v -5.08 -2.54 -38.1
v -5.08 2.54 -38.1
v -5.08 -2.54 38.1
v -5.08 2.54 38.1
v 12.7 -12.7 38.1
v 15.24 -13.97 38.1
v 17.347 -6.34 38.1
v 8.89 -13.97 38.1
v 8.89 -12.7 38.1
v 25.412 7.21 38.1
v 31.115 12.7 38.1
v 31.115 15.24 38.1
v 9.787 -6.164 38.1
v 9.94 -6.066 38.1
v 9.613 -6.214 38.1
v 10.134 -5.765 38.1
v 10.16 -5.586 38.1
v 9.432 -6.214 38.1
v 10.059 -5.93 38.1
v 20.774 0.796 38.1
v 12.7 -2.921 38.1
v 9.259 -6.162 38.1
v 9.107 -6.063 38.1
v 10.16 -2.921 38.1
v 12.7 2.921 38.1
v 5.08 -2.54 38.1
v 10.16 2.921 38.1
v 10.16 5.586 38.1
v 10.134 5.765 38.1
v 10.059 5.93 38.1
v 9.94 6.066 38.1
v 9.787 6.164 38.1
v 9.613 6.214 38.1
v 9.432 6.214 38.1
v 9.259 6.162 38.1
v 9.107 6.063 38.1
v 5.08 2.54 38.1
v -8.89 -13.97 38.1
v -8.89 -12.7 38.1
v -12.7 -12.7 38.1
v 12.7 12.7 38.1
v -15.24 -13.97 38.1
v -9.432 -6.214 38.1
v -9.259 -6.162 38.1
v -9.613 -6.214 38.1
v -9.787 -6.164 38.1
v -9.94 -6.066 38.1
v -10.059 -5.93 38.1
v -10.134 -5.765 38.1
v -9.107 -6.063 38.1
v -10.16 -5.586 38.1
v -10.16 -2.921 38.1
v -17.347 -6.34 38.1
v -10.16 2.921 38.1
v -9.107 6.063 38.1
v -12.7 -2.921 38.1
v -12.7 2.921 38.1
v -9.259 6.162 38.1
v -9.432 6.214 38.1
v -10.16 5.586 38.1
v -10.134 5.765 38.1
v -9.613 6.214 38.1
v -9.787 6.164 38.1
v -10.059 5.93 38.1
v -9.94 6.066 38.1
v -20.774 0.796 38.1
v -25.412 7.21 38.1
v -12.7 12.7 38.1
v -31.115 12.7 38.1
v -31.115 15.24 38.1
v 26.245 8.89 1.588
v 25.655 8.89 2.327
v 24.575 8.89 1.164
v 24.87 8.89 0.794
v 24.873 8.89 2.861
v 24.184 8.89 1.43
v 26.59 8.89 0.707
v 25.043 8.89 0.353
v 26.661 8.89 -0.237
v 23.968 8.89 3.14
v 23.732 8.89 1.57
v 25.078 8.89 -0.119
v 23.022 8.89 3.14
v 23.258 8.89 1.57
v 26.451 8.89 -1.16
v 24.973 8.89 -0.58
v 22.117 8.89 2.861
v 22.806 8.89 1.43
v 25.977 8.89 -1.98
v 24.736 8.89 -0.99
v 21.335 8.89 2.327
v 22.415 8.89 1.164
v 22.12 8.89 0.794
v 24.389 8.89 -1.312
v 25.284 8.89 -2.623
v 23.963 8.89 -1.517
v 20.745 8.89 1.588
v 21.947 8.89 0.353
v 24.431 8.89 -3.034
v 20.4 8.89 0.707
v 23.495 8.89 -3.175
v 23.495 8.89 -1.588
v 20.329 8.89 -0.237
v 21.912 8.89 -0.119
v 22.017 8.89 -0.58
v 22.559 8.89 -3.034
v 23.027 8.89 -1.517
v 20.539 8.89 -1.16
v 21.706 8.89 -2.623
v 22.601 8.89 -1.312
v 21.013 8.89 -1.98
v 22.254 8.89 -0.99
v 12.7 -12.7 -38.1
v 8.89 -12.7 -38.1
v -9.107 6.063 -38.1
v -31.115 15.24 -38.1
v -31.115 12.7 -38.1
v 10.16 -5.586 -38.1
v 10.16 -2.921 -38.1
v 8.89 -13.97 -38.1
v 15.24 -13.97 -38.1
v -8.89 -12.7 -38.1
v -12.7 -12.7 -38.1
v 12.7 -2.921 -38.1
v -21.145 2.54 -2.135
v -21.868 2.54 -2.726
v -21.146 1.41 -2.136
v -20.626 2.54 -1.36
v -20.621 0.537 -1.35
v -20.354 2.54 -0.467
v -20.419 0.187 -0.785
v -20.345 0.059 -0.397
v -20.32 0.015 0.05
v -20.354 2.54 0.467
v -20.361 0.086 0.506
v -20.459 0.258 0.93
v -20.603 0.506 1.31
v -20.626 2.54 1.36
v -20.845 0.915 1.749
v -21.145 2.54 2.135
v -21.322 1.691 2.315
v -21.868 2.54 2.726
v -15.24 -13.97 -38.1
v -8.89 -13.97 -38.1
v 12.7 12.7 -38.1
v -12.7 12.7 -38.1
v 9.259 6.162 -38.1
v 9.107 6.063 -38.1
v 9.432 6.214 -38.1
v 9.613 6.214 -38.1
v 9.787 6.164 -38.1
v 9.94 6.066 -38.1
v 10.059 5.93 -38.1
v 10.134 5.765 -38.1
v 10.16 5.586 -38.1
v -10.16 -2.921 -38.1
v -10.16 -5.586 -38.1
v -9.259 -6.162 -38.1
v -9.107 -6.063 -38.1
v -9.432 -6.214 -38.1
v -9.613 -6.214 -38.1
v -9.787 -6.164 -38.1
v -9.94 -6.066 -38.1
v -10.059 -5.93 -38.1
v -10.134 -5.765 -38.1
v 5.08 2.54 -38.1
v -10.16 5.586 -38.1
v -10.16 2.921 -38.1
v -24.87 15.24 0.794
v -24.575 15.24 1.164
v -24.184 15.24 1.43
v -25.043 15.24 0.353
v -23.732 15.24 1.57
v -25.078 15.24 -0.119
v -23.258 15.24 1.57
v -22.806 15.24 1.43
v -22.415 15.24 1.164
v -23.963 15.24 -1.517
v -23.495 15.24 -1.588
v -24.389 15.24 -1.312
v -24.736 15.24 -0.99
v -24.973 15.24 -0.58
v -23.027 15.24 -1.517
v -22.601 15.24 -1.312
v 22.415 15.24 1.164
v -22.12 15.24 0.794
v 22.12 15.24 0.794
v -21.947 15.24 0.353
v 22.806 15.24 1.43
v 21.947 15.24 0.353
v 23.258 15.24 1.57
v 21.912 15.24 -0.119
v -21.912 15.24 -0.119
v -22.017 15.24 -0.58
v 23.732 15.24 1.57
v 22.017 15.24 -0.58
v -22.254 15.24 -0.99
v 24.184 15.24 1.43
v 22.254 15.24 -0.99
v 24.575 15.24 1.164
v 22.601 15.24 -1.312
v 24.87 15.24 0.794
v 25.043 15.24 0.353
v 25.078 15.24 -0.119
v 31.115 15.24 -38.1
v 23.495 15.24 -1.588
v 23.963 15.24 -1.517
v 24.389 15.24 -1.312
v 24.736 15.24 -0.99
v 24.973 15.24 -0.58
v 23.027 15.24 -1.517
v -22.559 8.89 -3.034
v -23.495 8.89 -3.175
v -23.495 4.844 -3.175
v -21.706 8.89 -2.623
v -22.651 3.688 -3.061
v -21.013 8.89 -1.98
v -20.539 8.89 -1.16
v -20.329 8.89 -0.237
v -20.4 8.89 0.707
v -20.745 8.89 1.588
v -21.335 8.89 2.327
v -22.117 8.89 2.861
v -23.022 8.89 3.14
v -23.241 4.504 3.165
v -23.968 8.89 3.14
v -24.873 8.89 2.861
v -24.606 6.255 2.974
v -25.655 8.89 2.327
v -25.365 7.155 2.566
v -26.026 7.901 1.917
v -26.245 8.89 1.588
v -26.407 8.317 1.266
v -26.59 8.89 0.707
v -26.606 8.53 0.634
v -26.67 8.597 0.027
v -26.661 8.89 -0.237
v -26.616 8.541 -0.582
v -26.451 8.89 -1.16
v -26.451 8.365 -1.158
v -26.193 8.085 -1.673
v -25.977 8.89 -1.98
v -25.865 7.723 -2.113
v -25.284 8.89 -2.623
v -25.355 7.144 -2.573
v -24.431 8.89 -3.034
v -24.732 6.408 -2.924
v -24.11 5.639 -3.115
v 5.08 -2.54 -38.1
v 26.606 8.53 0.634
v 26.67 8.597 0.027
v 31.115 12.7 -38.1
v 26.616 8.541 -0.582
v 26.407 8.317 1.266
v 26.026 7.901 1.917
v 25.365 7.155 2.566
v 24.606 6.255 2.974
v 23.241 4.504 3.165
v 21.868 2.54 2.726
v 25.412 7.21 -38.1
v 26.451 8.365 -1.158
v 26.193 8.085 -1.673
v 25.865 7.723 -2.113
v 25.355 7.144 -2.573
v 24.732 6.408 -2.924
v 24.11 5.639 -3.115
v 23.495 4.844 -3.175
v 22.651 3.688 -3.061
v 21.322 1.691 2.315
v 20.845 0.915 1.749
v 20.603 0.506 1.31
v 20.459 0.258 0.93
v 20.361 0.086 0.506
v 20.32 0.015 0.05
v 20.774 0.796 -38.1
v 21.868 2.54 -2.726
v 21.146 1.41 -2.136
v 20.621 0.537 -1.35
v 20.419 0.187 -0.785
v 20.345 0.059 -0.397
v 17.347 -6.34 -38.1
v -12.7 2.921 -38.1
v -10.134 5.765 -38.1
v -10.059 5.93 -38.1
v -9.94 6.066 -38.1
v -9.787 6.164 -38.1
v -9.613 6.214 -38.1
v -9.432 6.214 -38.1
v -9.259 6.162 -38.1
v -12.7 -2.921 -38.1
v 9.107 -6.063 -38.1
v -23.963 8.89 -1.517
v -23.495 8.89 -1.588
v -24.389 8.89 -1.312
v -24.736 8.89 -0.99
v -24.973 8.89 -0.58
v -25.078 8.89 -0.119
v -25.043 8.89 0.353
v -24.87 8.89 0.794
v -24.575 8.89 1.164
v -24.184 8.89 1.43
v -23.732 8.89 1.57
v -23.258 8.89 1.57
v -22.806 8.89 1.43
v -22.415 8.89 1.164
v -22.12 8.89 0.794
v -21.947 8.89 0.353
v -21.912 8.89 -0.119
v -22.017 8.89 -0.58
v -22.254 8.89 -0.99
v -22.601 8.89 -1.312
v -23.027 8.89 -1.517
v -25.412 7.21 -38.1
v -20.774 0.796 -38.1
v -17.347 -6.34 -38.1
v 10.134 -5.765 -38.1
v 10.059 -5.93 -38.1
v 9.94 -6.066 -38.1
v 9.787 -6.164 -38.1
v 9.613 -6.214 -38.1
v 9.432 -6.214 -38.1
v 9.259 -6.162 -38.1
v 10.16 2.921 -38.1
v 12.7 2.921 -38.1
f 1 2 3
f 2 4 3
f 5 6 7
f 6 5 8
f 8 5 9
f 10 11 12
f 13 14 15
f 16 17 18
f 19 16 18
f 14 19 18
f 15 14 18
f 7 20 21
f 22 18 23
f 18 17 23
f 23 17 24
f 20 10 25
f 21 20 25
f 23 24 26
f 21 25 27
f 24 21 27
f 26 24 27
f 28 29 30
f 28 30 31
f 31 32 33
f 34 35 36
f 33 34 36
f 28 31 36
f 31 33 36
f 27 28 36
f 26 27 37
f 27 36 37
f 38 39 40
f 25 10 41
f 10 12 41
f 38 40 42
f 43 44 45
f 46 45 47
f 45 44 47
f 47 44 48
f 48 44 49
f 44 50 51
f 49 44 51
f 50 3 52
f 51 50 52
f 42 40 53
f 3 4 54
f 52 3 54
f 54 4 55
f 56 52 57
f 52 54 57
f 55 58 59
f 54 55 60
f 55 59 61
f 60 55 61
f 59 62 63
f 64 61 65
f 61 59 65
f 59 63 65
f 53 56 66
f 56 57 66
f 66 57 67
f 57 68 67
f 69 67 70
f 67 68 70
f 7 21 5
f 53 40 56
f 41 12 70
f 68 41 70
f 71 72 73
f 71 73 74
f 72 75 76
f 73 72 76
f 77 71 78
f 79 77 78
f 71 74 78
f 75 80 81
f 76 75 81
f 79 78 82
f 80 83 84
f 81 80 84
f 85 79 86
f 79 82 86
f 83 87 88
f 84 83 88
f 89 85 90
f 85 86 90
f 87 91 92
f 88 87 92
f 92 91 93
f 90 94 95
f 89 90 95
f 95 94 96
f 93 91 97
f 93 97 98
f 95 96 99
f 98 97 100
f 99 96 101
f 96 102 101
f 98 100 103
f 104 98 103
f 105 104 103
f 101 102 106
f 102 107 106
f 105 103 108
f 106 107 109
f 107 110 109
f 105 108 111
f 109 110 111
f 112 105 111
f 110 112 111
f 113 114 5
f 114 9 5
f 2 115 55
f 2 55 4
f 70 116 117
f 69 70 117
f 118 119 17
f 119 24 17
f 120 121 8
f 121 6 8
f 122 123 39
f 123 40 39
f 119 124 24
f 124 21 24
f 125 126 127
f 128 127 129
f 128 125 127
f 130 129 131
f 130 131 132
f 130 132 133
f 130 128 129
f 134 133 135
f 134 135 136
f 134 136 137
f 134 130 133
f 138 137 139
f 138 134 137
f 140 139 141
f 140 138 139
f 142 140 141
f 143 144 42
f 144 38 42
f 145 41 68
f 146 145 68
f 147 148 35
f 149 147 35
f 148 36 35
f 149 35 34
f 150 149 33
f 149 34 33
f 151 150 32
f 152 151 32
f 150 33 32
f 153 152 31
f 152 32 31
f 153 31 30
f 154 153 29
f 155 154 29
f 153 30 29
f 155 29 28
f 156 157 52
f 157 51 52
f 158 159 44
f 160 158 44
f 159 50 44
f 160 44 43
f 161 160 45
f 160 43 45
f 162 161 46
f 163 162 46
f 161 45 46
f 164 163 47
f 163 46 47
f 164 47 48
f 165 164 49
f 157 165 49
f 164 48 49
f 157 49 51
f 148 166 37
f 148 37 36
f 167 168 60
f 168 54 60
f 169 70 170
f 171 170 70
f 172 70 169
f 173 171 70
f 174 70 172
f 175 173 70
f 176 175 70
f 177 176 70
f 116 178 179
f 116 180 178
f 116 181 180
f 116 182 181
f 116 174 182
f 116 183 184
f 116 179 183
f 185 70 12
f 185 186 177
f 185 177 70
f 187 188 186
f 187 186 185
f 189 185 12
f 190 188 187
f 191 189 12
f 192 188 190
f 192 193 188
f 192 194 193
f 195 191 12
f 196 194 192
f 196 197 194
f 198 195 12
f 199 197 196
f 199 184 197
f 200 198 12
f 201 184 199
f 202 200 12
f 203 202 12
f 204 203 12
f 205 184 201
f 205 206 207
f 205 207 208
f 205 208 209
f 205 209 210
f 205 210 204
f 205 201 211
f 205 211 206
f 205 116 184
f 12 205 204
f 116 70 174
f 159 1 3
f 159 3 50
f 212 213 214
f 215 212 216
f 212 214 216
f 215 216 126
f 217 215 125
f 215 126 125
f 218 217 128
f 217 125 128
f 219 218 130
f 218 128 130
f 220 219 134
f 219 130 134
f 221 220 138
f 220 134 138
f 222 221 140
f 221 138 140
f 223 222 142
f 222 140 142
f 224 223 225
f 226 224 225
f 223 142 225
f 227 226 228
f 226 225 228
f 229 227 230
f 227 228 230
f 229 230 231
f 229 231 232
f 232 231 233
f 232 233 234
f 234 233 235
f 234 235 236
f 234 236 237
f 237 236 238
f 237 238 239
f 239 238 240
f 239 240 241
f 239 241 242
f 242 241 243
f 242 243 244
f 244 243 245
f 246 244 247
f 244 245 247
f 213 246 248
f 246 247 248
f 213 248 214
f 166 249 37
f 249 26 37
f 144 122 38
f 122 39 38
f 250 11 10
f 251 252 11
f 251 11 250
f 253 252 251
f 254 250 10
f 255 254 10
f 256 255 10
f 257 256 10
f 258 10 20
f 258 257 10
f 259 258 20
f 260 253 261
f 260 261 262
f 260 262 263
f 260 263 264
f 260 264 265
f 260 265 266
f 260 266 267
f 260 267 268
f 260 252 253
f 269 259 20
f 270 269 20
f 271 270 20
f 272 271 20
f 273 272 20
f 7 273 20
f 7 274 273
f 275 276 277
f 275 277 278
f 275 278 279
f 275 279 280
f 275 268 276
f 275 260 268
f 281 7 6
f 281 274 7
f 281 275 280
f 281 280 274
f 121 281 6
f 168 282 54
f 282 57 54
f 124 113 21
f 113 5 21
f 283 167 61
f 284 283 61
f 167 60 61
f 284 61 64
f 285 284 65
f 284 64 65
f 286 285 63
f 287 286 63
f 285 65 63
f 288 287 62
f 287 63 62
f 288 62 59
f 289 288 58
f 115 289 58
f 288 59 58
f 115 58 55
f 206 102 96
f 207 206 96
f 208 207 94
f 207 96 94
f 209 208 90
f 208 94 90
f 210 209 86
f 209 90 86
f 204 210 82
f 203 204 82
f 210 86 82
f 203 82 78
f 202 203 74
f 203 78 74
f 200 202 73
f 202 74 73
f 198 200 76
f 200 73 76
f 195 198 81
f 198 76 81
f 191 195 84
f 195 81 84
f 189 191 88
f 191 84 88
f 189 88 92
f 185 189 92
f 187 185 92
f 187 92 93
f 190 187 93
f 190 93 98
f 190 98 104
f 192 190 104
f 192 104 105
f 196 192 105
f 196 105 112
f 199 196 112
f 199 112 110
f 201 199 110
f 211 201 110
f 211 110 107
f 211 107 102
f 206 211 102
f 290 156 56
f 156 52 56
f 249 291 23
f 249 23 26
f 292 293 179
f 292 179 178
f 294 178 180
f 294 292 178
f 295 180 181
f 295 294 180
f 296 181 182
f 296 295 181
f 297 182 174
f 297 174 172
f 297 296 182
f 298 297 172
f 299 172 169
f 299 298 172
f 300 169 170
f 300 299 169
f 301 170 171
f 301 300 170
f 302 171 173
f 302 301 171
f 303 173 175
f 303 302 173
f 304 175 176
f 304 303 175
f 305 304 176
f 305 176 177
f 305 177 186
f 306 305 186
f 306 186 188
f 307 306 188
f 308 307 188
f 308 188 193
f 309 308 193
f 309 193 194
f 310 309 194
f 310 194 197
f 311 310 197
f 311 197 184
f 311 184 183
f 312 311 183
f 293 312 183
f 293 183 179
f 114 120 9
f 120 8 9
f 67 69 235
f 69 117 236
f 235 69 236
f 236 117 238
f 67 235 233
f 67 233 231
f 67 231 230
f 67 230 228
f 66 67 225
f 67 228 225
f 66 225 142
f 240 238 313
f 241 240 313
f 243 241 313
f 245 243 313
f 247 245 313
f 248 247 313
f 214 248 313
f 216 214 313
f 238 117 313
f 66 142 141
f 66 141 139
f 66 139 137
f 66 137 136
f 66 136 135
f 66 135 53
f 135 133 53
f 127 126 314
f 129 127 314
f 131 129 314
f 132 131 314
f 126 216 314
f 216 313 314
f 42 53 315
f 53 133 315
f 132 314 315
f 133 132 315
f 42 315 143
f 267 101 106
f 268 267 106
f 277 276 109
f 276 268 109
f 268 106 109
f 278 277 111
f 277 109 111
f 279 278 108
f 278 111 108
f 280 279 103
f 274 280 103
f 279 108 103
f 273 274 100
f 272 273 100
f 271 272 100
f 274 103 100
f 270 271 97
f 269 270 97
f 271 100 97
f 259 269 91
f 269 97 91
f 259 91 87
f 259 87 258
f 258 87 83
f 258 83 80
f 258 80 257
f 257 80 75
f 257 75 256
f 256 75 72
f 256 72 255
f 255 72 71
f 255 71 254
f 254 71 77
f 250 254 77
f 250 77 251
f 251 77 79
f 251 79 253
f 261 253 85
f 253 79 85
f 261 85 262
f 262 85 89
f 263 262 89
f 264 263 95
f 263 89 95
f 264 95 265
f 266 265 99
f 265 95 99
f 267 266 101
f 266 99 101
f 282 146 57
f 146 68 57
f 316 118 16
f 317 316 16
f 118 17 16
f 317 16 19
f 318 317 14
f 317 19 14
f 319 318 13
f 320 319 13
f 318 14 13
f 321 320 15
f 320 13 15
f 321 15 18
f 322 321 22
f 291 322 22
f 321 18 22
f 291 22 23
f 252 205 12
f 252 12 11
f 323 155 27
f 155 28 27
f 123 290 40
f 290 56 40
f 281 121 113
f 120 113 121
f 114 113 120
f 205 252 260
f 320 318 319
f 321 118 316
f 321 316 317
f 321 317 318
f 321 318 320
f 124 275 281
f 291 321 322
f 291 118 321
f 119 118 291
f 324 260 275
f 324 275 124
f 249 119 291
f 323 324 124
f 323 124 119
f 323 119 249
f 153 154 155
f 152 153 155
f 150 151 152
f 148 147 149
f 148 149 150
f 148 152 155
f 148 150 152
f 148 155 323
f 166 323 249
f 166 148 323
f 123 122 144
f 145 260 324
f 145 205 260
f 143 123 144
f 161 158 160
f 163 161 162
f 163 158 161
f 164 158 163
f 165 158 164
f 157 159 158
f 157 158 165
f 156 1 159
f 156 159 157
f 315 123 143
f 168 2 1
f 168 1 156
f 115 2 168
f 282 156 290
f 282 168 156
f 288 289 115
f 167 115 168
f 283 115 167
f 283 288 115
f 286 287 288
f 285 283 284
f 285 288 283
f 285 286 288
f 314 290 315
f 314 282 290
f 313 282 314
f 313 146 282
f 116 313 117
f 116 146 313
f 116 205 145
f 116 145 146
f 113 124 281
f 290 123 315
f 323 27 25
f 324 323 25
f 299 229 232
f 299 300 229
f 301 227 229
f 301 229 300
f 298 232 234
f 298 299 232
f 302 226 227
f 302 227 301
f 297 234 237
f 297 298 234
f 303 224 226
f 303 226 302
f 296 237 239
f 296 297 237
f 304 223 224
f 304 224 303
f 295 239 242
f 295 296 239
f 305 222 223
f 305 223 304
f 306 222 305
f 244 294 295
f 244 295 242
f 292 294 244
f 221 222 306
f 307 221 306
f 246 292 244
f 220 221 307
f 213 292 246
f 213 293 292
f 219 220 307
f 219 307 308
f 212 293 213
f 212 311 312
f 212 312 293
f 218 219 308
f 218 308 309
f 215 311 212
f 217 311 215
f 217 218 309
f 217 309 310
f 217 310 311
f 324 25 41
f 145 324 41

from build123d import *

# Parameters (mm, degrees)
BOSS_EXTRUDE1_DEPTH            = 38.1
BOSS_EXTRUDE3_DEPTH            = 76.2
CUT_EXTRUDE1_REACH             = 53.888
SKETCH4_R                      = 3.175
CUT_EXTRUDE1_DIRECTION_2_DEPTH = 6.35
CUT_EXTRUDE2_REACH             = 56.243
SKETCH5_R                      = 1.5875


with BuildPart() as part:
    # Sketch1 → Boss-Extrude1 (new, symmetric)
    with BuildSketch(Plane.XY):
        with BuildLine():
            Line((12.7, 12.7), (-12.7, 12.7))
            Line((-12.7, 12.7), (-12.7, 2.921))
            Line((-12.7, 2.921), (-10.16, 2.921))
            Line((-10.16, 2.921), (-10.16, 5.585607176))
            ThreePointArc((-10.16, 5.585607176), (-9.787392339, 6.163859076), (-9.106849574, 6.063493377))
            Line((-9.106849574, 6.063493377), (-5.08, 2.54))
            Line((-5.08, 2.54), (-5.08, -2.54))
            Line((-5.08, -2.54), (-9.106849574, -6.063493377))
            ThreePointArc((-9.106849574, -6.063493377), (-9.787392339, -6.163859076), (-10.16, -5.585607176))
            Line((-10.16, -5.585607176), (-10.16, -2.921))
            Line((-10.16, -2.921), (-12.7, -2.921))
            Line((-12.7, -2.921), (-12.7, -12.7))
            Line((-12.7, -12.7), (-8.89, -12.7))
            Line((-8.89, -12.7), (-8.89, -13.97))
            Line((-8.89, -13.97), (-15.24, -13.97))
            Line((-15.24, -13.97), (-15.24, 15.24))
            Line((-15.24, 15.24), (15.24, 15.24))
            Line((15.24, 15.24), (15.24, -13.97))
            Line((15.24, -13.97), (8.89, -13.97))
            Line((8.89, -13.97), (8.89, -12.7))
            Line((8.89, -12.7), (12.7, -12.7))
            Line((12.7, -12.7), (12.7, -2.921))
            Line((12.7, -2.921), (10.16, -2.921))
            Line((10.16, -2.921), (10.16, -5.585607176))
            ThreePointArc((10.16, -5.585607176), (9.787392339, -6.163859076), (9.106849574, -6.063493377))
            Line((9.106849574, -6.063493377), (5.08, -2.54))
            Line((5.08, -2.54), (5.08, 2.54))
            Line((5.08, 2.54), (9.106849574, 6.063493377))
            ThreePointArc((9.106849574, 6.063493377), (9.787392339, 6.163859076), (10.16, 5.585607176))
            Line((10.16, 5.585607176), (10.16, 2.921))
            Line((10.16, 2.921), (12.7, 2.921))
            Line((12.7, 2.921), (12.7, 12.7))
        make_face()
    extrude(amount=BOSS_EXTRUDE1_DEPTH, both=True)

    # Sketch6 → Boss-Extrude3 (add)
    with BuildSketch(Plane(origin=(0, 0, -38.1), x_dir=(-1, 0, 0), z_dir=(0, 0, -1))):
        with BuildLine():
            Line((-15.24, 15.24), (-31.115, 15.24))
            Line((-31.115, 15.24), (-31.115, 12.7))
            ThreePointArc((-31.115, 12.7), (-20.774098647, 0.795596044), (-15.24, -13.97))
            Line((-15.24, -13.97), (-15.24, 15.24))
        make_face()
        with BuildLine():
            Line((15.24, 15.24), (31.115, 15.24))
            Line((31.115, 15.24), (31.115, 12.7))
            ThreePointArc((31.115, 12.7), (20.774098647, 0.795596044), (15.24, -13.97))
            Line((15.24, -13.97), (15.24, 15.24))
        make_face()
    extrude(amount=-BOSS_EXTRUDE3_DEPTH)

    # Sketch4 → Cut-Extrude1 (cut, up to next)
    with BuildSketch(Plane(origin=(0, 2.54, 0), x_dir=(1, 0, 0), z_dir=(0, 1, 0)), mode=Mode.PRIVATE) as cut_extrude1_sk1:
        with Locations(Location((23.495, 0, 0), (0, 0, 90))):
            Circle(SKETCH4_R)
    cut_extrude1_tool1 = extrude(cut_extrude1_sk1.sketch, amount=-CUT_EXTRUDE1_REACH, mode=Mode.PRIVATE) & part.part
    cut_extrude1 = cut_extrude1_tool1.solids().sort_by_distance((23.495, 2.54, 0))[0]
    add(cut_extrude1, mode=Mode.SUBTRACT)

    # Sketch4 → Cut-Extrude1 direction 2 (cut)
    with BuildSketch(Plane(origin=(0, 2.54, 0), x_dir=(1, 0, 0), z_dir=(0, 1, 0))):
        with Locations(Location((23.495, 0, 0), (0, 0, 90))):
            Circle(SKETCH4_R)
    cut_extrude1_direction_2 = extrude(amount=CUT_EXTRUDE1_DIRECTION_2_DEPTH, mode=Mode.SUBTRACT)

    # Sketch5 → Cut-Extrude2 (cut, up to next)
    with BuildSketch(Plane.XZ.offset(-8.89), mode=Mode.PRIVATE) as cut_extrude2_sk1:
        with Locations(Location((23.495, 0, 0), (0, 0, 270))):
            Circle(SKETCH5_R)
    cut_extrude2_tool1 = extrude(cut_extrude2_sk1.sketch, amount=-CUT_EXTRUDE2_REACH, mode=Mode.PRIVATE) & part.part
    cut_extrude2 = cut_extrude2_tool1.solids().sort_by_distance((23.495, 8.89, 0))[0]
    add(cut_extrude2, mode=Mode.SUBTRACT)

    # Mirror1: Cut-Extrude1, Cut-Extrude1 direction 2, Cut-Extrude2 across plane
    add(cut_extrude1.mirror(Plane(origin=(0, 0, 0), x_dir=(0, 0, 1), z_dir=(1, 0, 0))), mode=Mode.SUBTRACT)
    add(cut_extrude1_direction_2.mirror(Plane(origin=(0, 0, 0), x_dir=(0, 0, 1), z_dir=(1, 0, 0))), mode=Mode.SUBTRACT)
    add(cut_extrude2.mirror(Plane(origin=(0, 0, 0), x_dir=(0, 0, 1), z_dir=(1, 0, 0))), mode=Mode.SUBTRACT)


solid = part.part
